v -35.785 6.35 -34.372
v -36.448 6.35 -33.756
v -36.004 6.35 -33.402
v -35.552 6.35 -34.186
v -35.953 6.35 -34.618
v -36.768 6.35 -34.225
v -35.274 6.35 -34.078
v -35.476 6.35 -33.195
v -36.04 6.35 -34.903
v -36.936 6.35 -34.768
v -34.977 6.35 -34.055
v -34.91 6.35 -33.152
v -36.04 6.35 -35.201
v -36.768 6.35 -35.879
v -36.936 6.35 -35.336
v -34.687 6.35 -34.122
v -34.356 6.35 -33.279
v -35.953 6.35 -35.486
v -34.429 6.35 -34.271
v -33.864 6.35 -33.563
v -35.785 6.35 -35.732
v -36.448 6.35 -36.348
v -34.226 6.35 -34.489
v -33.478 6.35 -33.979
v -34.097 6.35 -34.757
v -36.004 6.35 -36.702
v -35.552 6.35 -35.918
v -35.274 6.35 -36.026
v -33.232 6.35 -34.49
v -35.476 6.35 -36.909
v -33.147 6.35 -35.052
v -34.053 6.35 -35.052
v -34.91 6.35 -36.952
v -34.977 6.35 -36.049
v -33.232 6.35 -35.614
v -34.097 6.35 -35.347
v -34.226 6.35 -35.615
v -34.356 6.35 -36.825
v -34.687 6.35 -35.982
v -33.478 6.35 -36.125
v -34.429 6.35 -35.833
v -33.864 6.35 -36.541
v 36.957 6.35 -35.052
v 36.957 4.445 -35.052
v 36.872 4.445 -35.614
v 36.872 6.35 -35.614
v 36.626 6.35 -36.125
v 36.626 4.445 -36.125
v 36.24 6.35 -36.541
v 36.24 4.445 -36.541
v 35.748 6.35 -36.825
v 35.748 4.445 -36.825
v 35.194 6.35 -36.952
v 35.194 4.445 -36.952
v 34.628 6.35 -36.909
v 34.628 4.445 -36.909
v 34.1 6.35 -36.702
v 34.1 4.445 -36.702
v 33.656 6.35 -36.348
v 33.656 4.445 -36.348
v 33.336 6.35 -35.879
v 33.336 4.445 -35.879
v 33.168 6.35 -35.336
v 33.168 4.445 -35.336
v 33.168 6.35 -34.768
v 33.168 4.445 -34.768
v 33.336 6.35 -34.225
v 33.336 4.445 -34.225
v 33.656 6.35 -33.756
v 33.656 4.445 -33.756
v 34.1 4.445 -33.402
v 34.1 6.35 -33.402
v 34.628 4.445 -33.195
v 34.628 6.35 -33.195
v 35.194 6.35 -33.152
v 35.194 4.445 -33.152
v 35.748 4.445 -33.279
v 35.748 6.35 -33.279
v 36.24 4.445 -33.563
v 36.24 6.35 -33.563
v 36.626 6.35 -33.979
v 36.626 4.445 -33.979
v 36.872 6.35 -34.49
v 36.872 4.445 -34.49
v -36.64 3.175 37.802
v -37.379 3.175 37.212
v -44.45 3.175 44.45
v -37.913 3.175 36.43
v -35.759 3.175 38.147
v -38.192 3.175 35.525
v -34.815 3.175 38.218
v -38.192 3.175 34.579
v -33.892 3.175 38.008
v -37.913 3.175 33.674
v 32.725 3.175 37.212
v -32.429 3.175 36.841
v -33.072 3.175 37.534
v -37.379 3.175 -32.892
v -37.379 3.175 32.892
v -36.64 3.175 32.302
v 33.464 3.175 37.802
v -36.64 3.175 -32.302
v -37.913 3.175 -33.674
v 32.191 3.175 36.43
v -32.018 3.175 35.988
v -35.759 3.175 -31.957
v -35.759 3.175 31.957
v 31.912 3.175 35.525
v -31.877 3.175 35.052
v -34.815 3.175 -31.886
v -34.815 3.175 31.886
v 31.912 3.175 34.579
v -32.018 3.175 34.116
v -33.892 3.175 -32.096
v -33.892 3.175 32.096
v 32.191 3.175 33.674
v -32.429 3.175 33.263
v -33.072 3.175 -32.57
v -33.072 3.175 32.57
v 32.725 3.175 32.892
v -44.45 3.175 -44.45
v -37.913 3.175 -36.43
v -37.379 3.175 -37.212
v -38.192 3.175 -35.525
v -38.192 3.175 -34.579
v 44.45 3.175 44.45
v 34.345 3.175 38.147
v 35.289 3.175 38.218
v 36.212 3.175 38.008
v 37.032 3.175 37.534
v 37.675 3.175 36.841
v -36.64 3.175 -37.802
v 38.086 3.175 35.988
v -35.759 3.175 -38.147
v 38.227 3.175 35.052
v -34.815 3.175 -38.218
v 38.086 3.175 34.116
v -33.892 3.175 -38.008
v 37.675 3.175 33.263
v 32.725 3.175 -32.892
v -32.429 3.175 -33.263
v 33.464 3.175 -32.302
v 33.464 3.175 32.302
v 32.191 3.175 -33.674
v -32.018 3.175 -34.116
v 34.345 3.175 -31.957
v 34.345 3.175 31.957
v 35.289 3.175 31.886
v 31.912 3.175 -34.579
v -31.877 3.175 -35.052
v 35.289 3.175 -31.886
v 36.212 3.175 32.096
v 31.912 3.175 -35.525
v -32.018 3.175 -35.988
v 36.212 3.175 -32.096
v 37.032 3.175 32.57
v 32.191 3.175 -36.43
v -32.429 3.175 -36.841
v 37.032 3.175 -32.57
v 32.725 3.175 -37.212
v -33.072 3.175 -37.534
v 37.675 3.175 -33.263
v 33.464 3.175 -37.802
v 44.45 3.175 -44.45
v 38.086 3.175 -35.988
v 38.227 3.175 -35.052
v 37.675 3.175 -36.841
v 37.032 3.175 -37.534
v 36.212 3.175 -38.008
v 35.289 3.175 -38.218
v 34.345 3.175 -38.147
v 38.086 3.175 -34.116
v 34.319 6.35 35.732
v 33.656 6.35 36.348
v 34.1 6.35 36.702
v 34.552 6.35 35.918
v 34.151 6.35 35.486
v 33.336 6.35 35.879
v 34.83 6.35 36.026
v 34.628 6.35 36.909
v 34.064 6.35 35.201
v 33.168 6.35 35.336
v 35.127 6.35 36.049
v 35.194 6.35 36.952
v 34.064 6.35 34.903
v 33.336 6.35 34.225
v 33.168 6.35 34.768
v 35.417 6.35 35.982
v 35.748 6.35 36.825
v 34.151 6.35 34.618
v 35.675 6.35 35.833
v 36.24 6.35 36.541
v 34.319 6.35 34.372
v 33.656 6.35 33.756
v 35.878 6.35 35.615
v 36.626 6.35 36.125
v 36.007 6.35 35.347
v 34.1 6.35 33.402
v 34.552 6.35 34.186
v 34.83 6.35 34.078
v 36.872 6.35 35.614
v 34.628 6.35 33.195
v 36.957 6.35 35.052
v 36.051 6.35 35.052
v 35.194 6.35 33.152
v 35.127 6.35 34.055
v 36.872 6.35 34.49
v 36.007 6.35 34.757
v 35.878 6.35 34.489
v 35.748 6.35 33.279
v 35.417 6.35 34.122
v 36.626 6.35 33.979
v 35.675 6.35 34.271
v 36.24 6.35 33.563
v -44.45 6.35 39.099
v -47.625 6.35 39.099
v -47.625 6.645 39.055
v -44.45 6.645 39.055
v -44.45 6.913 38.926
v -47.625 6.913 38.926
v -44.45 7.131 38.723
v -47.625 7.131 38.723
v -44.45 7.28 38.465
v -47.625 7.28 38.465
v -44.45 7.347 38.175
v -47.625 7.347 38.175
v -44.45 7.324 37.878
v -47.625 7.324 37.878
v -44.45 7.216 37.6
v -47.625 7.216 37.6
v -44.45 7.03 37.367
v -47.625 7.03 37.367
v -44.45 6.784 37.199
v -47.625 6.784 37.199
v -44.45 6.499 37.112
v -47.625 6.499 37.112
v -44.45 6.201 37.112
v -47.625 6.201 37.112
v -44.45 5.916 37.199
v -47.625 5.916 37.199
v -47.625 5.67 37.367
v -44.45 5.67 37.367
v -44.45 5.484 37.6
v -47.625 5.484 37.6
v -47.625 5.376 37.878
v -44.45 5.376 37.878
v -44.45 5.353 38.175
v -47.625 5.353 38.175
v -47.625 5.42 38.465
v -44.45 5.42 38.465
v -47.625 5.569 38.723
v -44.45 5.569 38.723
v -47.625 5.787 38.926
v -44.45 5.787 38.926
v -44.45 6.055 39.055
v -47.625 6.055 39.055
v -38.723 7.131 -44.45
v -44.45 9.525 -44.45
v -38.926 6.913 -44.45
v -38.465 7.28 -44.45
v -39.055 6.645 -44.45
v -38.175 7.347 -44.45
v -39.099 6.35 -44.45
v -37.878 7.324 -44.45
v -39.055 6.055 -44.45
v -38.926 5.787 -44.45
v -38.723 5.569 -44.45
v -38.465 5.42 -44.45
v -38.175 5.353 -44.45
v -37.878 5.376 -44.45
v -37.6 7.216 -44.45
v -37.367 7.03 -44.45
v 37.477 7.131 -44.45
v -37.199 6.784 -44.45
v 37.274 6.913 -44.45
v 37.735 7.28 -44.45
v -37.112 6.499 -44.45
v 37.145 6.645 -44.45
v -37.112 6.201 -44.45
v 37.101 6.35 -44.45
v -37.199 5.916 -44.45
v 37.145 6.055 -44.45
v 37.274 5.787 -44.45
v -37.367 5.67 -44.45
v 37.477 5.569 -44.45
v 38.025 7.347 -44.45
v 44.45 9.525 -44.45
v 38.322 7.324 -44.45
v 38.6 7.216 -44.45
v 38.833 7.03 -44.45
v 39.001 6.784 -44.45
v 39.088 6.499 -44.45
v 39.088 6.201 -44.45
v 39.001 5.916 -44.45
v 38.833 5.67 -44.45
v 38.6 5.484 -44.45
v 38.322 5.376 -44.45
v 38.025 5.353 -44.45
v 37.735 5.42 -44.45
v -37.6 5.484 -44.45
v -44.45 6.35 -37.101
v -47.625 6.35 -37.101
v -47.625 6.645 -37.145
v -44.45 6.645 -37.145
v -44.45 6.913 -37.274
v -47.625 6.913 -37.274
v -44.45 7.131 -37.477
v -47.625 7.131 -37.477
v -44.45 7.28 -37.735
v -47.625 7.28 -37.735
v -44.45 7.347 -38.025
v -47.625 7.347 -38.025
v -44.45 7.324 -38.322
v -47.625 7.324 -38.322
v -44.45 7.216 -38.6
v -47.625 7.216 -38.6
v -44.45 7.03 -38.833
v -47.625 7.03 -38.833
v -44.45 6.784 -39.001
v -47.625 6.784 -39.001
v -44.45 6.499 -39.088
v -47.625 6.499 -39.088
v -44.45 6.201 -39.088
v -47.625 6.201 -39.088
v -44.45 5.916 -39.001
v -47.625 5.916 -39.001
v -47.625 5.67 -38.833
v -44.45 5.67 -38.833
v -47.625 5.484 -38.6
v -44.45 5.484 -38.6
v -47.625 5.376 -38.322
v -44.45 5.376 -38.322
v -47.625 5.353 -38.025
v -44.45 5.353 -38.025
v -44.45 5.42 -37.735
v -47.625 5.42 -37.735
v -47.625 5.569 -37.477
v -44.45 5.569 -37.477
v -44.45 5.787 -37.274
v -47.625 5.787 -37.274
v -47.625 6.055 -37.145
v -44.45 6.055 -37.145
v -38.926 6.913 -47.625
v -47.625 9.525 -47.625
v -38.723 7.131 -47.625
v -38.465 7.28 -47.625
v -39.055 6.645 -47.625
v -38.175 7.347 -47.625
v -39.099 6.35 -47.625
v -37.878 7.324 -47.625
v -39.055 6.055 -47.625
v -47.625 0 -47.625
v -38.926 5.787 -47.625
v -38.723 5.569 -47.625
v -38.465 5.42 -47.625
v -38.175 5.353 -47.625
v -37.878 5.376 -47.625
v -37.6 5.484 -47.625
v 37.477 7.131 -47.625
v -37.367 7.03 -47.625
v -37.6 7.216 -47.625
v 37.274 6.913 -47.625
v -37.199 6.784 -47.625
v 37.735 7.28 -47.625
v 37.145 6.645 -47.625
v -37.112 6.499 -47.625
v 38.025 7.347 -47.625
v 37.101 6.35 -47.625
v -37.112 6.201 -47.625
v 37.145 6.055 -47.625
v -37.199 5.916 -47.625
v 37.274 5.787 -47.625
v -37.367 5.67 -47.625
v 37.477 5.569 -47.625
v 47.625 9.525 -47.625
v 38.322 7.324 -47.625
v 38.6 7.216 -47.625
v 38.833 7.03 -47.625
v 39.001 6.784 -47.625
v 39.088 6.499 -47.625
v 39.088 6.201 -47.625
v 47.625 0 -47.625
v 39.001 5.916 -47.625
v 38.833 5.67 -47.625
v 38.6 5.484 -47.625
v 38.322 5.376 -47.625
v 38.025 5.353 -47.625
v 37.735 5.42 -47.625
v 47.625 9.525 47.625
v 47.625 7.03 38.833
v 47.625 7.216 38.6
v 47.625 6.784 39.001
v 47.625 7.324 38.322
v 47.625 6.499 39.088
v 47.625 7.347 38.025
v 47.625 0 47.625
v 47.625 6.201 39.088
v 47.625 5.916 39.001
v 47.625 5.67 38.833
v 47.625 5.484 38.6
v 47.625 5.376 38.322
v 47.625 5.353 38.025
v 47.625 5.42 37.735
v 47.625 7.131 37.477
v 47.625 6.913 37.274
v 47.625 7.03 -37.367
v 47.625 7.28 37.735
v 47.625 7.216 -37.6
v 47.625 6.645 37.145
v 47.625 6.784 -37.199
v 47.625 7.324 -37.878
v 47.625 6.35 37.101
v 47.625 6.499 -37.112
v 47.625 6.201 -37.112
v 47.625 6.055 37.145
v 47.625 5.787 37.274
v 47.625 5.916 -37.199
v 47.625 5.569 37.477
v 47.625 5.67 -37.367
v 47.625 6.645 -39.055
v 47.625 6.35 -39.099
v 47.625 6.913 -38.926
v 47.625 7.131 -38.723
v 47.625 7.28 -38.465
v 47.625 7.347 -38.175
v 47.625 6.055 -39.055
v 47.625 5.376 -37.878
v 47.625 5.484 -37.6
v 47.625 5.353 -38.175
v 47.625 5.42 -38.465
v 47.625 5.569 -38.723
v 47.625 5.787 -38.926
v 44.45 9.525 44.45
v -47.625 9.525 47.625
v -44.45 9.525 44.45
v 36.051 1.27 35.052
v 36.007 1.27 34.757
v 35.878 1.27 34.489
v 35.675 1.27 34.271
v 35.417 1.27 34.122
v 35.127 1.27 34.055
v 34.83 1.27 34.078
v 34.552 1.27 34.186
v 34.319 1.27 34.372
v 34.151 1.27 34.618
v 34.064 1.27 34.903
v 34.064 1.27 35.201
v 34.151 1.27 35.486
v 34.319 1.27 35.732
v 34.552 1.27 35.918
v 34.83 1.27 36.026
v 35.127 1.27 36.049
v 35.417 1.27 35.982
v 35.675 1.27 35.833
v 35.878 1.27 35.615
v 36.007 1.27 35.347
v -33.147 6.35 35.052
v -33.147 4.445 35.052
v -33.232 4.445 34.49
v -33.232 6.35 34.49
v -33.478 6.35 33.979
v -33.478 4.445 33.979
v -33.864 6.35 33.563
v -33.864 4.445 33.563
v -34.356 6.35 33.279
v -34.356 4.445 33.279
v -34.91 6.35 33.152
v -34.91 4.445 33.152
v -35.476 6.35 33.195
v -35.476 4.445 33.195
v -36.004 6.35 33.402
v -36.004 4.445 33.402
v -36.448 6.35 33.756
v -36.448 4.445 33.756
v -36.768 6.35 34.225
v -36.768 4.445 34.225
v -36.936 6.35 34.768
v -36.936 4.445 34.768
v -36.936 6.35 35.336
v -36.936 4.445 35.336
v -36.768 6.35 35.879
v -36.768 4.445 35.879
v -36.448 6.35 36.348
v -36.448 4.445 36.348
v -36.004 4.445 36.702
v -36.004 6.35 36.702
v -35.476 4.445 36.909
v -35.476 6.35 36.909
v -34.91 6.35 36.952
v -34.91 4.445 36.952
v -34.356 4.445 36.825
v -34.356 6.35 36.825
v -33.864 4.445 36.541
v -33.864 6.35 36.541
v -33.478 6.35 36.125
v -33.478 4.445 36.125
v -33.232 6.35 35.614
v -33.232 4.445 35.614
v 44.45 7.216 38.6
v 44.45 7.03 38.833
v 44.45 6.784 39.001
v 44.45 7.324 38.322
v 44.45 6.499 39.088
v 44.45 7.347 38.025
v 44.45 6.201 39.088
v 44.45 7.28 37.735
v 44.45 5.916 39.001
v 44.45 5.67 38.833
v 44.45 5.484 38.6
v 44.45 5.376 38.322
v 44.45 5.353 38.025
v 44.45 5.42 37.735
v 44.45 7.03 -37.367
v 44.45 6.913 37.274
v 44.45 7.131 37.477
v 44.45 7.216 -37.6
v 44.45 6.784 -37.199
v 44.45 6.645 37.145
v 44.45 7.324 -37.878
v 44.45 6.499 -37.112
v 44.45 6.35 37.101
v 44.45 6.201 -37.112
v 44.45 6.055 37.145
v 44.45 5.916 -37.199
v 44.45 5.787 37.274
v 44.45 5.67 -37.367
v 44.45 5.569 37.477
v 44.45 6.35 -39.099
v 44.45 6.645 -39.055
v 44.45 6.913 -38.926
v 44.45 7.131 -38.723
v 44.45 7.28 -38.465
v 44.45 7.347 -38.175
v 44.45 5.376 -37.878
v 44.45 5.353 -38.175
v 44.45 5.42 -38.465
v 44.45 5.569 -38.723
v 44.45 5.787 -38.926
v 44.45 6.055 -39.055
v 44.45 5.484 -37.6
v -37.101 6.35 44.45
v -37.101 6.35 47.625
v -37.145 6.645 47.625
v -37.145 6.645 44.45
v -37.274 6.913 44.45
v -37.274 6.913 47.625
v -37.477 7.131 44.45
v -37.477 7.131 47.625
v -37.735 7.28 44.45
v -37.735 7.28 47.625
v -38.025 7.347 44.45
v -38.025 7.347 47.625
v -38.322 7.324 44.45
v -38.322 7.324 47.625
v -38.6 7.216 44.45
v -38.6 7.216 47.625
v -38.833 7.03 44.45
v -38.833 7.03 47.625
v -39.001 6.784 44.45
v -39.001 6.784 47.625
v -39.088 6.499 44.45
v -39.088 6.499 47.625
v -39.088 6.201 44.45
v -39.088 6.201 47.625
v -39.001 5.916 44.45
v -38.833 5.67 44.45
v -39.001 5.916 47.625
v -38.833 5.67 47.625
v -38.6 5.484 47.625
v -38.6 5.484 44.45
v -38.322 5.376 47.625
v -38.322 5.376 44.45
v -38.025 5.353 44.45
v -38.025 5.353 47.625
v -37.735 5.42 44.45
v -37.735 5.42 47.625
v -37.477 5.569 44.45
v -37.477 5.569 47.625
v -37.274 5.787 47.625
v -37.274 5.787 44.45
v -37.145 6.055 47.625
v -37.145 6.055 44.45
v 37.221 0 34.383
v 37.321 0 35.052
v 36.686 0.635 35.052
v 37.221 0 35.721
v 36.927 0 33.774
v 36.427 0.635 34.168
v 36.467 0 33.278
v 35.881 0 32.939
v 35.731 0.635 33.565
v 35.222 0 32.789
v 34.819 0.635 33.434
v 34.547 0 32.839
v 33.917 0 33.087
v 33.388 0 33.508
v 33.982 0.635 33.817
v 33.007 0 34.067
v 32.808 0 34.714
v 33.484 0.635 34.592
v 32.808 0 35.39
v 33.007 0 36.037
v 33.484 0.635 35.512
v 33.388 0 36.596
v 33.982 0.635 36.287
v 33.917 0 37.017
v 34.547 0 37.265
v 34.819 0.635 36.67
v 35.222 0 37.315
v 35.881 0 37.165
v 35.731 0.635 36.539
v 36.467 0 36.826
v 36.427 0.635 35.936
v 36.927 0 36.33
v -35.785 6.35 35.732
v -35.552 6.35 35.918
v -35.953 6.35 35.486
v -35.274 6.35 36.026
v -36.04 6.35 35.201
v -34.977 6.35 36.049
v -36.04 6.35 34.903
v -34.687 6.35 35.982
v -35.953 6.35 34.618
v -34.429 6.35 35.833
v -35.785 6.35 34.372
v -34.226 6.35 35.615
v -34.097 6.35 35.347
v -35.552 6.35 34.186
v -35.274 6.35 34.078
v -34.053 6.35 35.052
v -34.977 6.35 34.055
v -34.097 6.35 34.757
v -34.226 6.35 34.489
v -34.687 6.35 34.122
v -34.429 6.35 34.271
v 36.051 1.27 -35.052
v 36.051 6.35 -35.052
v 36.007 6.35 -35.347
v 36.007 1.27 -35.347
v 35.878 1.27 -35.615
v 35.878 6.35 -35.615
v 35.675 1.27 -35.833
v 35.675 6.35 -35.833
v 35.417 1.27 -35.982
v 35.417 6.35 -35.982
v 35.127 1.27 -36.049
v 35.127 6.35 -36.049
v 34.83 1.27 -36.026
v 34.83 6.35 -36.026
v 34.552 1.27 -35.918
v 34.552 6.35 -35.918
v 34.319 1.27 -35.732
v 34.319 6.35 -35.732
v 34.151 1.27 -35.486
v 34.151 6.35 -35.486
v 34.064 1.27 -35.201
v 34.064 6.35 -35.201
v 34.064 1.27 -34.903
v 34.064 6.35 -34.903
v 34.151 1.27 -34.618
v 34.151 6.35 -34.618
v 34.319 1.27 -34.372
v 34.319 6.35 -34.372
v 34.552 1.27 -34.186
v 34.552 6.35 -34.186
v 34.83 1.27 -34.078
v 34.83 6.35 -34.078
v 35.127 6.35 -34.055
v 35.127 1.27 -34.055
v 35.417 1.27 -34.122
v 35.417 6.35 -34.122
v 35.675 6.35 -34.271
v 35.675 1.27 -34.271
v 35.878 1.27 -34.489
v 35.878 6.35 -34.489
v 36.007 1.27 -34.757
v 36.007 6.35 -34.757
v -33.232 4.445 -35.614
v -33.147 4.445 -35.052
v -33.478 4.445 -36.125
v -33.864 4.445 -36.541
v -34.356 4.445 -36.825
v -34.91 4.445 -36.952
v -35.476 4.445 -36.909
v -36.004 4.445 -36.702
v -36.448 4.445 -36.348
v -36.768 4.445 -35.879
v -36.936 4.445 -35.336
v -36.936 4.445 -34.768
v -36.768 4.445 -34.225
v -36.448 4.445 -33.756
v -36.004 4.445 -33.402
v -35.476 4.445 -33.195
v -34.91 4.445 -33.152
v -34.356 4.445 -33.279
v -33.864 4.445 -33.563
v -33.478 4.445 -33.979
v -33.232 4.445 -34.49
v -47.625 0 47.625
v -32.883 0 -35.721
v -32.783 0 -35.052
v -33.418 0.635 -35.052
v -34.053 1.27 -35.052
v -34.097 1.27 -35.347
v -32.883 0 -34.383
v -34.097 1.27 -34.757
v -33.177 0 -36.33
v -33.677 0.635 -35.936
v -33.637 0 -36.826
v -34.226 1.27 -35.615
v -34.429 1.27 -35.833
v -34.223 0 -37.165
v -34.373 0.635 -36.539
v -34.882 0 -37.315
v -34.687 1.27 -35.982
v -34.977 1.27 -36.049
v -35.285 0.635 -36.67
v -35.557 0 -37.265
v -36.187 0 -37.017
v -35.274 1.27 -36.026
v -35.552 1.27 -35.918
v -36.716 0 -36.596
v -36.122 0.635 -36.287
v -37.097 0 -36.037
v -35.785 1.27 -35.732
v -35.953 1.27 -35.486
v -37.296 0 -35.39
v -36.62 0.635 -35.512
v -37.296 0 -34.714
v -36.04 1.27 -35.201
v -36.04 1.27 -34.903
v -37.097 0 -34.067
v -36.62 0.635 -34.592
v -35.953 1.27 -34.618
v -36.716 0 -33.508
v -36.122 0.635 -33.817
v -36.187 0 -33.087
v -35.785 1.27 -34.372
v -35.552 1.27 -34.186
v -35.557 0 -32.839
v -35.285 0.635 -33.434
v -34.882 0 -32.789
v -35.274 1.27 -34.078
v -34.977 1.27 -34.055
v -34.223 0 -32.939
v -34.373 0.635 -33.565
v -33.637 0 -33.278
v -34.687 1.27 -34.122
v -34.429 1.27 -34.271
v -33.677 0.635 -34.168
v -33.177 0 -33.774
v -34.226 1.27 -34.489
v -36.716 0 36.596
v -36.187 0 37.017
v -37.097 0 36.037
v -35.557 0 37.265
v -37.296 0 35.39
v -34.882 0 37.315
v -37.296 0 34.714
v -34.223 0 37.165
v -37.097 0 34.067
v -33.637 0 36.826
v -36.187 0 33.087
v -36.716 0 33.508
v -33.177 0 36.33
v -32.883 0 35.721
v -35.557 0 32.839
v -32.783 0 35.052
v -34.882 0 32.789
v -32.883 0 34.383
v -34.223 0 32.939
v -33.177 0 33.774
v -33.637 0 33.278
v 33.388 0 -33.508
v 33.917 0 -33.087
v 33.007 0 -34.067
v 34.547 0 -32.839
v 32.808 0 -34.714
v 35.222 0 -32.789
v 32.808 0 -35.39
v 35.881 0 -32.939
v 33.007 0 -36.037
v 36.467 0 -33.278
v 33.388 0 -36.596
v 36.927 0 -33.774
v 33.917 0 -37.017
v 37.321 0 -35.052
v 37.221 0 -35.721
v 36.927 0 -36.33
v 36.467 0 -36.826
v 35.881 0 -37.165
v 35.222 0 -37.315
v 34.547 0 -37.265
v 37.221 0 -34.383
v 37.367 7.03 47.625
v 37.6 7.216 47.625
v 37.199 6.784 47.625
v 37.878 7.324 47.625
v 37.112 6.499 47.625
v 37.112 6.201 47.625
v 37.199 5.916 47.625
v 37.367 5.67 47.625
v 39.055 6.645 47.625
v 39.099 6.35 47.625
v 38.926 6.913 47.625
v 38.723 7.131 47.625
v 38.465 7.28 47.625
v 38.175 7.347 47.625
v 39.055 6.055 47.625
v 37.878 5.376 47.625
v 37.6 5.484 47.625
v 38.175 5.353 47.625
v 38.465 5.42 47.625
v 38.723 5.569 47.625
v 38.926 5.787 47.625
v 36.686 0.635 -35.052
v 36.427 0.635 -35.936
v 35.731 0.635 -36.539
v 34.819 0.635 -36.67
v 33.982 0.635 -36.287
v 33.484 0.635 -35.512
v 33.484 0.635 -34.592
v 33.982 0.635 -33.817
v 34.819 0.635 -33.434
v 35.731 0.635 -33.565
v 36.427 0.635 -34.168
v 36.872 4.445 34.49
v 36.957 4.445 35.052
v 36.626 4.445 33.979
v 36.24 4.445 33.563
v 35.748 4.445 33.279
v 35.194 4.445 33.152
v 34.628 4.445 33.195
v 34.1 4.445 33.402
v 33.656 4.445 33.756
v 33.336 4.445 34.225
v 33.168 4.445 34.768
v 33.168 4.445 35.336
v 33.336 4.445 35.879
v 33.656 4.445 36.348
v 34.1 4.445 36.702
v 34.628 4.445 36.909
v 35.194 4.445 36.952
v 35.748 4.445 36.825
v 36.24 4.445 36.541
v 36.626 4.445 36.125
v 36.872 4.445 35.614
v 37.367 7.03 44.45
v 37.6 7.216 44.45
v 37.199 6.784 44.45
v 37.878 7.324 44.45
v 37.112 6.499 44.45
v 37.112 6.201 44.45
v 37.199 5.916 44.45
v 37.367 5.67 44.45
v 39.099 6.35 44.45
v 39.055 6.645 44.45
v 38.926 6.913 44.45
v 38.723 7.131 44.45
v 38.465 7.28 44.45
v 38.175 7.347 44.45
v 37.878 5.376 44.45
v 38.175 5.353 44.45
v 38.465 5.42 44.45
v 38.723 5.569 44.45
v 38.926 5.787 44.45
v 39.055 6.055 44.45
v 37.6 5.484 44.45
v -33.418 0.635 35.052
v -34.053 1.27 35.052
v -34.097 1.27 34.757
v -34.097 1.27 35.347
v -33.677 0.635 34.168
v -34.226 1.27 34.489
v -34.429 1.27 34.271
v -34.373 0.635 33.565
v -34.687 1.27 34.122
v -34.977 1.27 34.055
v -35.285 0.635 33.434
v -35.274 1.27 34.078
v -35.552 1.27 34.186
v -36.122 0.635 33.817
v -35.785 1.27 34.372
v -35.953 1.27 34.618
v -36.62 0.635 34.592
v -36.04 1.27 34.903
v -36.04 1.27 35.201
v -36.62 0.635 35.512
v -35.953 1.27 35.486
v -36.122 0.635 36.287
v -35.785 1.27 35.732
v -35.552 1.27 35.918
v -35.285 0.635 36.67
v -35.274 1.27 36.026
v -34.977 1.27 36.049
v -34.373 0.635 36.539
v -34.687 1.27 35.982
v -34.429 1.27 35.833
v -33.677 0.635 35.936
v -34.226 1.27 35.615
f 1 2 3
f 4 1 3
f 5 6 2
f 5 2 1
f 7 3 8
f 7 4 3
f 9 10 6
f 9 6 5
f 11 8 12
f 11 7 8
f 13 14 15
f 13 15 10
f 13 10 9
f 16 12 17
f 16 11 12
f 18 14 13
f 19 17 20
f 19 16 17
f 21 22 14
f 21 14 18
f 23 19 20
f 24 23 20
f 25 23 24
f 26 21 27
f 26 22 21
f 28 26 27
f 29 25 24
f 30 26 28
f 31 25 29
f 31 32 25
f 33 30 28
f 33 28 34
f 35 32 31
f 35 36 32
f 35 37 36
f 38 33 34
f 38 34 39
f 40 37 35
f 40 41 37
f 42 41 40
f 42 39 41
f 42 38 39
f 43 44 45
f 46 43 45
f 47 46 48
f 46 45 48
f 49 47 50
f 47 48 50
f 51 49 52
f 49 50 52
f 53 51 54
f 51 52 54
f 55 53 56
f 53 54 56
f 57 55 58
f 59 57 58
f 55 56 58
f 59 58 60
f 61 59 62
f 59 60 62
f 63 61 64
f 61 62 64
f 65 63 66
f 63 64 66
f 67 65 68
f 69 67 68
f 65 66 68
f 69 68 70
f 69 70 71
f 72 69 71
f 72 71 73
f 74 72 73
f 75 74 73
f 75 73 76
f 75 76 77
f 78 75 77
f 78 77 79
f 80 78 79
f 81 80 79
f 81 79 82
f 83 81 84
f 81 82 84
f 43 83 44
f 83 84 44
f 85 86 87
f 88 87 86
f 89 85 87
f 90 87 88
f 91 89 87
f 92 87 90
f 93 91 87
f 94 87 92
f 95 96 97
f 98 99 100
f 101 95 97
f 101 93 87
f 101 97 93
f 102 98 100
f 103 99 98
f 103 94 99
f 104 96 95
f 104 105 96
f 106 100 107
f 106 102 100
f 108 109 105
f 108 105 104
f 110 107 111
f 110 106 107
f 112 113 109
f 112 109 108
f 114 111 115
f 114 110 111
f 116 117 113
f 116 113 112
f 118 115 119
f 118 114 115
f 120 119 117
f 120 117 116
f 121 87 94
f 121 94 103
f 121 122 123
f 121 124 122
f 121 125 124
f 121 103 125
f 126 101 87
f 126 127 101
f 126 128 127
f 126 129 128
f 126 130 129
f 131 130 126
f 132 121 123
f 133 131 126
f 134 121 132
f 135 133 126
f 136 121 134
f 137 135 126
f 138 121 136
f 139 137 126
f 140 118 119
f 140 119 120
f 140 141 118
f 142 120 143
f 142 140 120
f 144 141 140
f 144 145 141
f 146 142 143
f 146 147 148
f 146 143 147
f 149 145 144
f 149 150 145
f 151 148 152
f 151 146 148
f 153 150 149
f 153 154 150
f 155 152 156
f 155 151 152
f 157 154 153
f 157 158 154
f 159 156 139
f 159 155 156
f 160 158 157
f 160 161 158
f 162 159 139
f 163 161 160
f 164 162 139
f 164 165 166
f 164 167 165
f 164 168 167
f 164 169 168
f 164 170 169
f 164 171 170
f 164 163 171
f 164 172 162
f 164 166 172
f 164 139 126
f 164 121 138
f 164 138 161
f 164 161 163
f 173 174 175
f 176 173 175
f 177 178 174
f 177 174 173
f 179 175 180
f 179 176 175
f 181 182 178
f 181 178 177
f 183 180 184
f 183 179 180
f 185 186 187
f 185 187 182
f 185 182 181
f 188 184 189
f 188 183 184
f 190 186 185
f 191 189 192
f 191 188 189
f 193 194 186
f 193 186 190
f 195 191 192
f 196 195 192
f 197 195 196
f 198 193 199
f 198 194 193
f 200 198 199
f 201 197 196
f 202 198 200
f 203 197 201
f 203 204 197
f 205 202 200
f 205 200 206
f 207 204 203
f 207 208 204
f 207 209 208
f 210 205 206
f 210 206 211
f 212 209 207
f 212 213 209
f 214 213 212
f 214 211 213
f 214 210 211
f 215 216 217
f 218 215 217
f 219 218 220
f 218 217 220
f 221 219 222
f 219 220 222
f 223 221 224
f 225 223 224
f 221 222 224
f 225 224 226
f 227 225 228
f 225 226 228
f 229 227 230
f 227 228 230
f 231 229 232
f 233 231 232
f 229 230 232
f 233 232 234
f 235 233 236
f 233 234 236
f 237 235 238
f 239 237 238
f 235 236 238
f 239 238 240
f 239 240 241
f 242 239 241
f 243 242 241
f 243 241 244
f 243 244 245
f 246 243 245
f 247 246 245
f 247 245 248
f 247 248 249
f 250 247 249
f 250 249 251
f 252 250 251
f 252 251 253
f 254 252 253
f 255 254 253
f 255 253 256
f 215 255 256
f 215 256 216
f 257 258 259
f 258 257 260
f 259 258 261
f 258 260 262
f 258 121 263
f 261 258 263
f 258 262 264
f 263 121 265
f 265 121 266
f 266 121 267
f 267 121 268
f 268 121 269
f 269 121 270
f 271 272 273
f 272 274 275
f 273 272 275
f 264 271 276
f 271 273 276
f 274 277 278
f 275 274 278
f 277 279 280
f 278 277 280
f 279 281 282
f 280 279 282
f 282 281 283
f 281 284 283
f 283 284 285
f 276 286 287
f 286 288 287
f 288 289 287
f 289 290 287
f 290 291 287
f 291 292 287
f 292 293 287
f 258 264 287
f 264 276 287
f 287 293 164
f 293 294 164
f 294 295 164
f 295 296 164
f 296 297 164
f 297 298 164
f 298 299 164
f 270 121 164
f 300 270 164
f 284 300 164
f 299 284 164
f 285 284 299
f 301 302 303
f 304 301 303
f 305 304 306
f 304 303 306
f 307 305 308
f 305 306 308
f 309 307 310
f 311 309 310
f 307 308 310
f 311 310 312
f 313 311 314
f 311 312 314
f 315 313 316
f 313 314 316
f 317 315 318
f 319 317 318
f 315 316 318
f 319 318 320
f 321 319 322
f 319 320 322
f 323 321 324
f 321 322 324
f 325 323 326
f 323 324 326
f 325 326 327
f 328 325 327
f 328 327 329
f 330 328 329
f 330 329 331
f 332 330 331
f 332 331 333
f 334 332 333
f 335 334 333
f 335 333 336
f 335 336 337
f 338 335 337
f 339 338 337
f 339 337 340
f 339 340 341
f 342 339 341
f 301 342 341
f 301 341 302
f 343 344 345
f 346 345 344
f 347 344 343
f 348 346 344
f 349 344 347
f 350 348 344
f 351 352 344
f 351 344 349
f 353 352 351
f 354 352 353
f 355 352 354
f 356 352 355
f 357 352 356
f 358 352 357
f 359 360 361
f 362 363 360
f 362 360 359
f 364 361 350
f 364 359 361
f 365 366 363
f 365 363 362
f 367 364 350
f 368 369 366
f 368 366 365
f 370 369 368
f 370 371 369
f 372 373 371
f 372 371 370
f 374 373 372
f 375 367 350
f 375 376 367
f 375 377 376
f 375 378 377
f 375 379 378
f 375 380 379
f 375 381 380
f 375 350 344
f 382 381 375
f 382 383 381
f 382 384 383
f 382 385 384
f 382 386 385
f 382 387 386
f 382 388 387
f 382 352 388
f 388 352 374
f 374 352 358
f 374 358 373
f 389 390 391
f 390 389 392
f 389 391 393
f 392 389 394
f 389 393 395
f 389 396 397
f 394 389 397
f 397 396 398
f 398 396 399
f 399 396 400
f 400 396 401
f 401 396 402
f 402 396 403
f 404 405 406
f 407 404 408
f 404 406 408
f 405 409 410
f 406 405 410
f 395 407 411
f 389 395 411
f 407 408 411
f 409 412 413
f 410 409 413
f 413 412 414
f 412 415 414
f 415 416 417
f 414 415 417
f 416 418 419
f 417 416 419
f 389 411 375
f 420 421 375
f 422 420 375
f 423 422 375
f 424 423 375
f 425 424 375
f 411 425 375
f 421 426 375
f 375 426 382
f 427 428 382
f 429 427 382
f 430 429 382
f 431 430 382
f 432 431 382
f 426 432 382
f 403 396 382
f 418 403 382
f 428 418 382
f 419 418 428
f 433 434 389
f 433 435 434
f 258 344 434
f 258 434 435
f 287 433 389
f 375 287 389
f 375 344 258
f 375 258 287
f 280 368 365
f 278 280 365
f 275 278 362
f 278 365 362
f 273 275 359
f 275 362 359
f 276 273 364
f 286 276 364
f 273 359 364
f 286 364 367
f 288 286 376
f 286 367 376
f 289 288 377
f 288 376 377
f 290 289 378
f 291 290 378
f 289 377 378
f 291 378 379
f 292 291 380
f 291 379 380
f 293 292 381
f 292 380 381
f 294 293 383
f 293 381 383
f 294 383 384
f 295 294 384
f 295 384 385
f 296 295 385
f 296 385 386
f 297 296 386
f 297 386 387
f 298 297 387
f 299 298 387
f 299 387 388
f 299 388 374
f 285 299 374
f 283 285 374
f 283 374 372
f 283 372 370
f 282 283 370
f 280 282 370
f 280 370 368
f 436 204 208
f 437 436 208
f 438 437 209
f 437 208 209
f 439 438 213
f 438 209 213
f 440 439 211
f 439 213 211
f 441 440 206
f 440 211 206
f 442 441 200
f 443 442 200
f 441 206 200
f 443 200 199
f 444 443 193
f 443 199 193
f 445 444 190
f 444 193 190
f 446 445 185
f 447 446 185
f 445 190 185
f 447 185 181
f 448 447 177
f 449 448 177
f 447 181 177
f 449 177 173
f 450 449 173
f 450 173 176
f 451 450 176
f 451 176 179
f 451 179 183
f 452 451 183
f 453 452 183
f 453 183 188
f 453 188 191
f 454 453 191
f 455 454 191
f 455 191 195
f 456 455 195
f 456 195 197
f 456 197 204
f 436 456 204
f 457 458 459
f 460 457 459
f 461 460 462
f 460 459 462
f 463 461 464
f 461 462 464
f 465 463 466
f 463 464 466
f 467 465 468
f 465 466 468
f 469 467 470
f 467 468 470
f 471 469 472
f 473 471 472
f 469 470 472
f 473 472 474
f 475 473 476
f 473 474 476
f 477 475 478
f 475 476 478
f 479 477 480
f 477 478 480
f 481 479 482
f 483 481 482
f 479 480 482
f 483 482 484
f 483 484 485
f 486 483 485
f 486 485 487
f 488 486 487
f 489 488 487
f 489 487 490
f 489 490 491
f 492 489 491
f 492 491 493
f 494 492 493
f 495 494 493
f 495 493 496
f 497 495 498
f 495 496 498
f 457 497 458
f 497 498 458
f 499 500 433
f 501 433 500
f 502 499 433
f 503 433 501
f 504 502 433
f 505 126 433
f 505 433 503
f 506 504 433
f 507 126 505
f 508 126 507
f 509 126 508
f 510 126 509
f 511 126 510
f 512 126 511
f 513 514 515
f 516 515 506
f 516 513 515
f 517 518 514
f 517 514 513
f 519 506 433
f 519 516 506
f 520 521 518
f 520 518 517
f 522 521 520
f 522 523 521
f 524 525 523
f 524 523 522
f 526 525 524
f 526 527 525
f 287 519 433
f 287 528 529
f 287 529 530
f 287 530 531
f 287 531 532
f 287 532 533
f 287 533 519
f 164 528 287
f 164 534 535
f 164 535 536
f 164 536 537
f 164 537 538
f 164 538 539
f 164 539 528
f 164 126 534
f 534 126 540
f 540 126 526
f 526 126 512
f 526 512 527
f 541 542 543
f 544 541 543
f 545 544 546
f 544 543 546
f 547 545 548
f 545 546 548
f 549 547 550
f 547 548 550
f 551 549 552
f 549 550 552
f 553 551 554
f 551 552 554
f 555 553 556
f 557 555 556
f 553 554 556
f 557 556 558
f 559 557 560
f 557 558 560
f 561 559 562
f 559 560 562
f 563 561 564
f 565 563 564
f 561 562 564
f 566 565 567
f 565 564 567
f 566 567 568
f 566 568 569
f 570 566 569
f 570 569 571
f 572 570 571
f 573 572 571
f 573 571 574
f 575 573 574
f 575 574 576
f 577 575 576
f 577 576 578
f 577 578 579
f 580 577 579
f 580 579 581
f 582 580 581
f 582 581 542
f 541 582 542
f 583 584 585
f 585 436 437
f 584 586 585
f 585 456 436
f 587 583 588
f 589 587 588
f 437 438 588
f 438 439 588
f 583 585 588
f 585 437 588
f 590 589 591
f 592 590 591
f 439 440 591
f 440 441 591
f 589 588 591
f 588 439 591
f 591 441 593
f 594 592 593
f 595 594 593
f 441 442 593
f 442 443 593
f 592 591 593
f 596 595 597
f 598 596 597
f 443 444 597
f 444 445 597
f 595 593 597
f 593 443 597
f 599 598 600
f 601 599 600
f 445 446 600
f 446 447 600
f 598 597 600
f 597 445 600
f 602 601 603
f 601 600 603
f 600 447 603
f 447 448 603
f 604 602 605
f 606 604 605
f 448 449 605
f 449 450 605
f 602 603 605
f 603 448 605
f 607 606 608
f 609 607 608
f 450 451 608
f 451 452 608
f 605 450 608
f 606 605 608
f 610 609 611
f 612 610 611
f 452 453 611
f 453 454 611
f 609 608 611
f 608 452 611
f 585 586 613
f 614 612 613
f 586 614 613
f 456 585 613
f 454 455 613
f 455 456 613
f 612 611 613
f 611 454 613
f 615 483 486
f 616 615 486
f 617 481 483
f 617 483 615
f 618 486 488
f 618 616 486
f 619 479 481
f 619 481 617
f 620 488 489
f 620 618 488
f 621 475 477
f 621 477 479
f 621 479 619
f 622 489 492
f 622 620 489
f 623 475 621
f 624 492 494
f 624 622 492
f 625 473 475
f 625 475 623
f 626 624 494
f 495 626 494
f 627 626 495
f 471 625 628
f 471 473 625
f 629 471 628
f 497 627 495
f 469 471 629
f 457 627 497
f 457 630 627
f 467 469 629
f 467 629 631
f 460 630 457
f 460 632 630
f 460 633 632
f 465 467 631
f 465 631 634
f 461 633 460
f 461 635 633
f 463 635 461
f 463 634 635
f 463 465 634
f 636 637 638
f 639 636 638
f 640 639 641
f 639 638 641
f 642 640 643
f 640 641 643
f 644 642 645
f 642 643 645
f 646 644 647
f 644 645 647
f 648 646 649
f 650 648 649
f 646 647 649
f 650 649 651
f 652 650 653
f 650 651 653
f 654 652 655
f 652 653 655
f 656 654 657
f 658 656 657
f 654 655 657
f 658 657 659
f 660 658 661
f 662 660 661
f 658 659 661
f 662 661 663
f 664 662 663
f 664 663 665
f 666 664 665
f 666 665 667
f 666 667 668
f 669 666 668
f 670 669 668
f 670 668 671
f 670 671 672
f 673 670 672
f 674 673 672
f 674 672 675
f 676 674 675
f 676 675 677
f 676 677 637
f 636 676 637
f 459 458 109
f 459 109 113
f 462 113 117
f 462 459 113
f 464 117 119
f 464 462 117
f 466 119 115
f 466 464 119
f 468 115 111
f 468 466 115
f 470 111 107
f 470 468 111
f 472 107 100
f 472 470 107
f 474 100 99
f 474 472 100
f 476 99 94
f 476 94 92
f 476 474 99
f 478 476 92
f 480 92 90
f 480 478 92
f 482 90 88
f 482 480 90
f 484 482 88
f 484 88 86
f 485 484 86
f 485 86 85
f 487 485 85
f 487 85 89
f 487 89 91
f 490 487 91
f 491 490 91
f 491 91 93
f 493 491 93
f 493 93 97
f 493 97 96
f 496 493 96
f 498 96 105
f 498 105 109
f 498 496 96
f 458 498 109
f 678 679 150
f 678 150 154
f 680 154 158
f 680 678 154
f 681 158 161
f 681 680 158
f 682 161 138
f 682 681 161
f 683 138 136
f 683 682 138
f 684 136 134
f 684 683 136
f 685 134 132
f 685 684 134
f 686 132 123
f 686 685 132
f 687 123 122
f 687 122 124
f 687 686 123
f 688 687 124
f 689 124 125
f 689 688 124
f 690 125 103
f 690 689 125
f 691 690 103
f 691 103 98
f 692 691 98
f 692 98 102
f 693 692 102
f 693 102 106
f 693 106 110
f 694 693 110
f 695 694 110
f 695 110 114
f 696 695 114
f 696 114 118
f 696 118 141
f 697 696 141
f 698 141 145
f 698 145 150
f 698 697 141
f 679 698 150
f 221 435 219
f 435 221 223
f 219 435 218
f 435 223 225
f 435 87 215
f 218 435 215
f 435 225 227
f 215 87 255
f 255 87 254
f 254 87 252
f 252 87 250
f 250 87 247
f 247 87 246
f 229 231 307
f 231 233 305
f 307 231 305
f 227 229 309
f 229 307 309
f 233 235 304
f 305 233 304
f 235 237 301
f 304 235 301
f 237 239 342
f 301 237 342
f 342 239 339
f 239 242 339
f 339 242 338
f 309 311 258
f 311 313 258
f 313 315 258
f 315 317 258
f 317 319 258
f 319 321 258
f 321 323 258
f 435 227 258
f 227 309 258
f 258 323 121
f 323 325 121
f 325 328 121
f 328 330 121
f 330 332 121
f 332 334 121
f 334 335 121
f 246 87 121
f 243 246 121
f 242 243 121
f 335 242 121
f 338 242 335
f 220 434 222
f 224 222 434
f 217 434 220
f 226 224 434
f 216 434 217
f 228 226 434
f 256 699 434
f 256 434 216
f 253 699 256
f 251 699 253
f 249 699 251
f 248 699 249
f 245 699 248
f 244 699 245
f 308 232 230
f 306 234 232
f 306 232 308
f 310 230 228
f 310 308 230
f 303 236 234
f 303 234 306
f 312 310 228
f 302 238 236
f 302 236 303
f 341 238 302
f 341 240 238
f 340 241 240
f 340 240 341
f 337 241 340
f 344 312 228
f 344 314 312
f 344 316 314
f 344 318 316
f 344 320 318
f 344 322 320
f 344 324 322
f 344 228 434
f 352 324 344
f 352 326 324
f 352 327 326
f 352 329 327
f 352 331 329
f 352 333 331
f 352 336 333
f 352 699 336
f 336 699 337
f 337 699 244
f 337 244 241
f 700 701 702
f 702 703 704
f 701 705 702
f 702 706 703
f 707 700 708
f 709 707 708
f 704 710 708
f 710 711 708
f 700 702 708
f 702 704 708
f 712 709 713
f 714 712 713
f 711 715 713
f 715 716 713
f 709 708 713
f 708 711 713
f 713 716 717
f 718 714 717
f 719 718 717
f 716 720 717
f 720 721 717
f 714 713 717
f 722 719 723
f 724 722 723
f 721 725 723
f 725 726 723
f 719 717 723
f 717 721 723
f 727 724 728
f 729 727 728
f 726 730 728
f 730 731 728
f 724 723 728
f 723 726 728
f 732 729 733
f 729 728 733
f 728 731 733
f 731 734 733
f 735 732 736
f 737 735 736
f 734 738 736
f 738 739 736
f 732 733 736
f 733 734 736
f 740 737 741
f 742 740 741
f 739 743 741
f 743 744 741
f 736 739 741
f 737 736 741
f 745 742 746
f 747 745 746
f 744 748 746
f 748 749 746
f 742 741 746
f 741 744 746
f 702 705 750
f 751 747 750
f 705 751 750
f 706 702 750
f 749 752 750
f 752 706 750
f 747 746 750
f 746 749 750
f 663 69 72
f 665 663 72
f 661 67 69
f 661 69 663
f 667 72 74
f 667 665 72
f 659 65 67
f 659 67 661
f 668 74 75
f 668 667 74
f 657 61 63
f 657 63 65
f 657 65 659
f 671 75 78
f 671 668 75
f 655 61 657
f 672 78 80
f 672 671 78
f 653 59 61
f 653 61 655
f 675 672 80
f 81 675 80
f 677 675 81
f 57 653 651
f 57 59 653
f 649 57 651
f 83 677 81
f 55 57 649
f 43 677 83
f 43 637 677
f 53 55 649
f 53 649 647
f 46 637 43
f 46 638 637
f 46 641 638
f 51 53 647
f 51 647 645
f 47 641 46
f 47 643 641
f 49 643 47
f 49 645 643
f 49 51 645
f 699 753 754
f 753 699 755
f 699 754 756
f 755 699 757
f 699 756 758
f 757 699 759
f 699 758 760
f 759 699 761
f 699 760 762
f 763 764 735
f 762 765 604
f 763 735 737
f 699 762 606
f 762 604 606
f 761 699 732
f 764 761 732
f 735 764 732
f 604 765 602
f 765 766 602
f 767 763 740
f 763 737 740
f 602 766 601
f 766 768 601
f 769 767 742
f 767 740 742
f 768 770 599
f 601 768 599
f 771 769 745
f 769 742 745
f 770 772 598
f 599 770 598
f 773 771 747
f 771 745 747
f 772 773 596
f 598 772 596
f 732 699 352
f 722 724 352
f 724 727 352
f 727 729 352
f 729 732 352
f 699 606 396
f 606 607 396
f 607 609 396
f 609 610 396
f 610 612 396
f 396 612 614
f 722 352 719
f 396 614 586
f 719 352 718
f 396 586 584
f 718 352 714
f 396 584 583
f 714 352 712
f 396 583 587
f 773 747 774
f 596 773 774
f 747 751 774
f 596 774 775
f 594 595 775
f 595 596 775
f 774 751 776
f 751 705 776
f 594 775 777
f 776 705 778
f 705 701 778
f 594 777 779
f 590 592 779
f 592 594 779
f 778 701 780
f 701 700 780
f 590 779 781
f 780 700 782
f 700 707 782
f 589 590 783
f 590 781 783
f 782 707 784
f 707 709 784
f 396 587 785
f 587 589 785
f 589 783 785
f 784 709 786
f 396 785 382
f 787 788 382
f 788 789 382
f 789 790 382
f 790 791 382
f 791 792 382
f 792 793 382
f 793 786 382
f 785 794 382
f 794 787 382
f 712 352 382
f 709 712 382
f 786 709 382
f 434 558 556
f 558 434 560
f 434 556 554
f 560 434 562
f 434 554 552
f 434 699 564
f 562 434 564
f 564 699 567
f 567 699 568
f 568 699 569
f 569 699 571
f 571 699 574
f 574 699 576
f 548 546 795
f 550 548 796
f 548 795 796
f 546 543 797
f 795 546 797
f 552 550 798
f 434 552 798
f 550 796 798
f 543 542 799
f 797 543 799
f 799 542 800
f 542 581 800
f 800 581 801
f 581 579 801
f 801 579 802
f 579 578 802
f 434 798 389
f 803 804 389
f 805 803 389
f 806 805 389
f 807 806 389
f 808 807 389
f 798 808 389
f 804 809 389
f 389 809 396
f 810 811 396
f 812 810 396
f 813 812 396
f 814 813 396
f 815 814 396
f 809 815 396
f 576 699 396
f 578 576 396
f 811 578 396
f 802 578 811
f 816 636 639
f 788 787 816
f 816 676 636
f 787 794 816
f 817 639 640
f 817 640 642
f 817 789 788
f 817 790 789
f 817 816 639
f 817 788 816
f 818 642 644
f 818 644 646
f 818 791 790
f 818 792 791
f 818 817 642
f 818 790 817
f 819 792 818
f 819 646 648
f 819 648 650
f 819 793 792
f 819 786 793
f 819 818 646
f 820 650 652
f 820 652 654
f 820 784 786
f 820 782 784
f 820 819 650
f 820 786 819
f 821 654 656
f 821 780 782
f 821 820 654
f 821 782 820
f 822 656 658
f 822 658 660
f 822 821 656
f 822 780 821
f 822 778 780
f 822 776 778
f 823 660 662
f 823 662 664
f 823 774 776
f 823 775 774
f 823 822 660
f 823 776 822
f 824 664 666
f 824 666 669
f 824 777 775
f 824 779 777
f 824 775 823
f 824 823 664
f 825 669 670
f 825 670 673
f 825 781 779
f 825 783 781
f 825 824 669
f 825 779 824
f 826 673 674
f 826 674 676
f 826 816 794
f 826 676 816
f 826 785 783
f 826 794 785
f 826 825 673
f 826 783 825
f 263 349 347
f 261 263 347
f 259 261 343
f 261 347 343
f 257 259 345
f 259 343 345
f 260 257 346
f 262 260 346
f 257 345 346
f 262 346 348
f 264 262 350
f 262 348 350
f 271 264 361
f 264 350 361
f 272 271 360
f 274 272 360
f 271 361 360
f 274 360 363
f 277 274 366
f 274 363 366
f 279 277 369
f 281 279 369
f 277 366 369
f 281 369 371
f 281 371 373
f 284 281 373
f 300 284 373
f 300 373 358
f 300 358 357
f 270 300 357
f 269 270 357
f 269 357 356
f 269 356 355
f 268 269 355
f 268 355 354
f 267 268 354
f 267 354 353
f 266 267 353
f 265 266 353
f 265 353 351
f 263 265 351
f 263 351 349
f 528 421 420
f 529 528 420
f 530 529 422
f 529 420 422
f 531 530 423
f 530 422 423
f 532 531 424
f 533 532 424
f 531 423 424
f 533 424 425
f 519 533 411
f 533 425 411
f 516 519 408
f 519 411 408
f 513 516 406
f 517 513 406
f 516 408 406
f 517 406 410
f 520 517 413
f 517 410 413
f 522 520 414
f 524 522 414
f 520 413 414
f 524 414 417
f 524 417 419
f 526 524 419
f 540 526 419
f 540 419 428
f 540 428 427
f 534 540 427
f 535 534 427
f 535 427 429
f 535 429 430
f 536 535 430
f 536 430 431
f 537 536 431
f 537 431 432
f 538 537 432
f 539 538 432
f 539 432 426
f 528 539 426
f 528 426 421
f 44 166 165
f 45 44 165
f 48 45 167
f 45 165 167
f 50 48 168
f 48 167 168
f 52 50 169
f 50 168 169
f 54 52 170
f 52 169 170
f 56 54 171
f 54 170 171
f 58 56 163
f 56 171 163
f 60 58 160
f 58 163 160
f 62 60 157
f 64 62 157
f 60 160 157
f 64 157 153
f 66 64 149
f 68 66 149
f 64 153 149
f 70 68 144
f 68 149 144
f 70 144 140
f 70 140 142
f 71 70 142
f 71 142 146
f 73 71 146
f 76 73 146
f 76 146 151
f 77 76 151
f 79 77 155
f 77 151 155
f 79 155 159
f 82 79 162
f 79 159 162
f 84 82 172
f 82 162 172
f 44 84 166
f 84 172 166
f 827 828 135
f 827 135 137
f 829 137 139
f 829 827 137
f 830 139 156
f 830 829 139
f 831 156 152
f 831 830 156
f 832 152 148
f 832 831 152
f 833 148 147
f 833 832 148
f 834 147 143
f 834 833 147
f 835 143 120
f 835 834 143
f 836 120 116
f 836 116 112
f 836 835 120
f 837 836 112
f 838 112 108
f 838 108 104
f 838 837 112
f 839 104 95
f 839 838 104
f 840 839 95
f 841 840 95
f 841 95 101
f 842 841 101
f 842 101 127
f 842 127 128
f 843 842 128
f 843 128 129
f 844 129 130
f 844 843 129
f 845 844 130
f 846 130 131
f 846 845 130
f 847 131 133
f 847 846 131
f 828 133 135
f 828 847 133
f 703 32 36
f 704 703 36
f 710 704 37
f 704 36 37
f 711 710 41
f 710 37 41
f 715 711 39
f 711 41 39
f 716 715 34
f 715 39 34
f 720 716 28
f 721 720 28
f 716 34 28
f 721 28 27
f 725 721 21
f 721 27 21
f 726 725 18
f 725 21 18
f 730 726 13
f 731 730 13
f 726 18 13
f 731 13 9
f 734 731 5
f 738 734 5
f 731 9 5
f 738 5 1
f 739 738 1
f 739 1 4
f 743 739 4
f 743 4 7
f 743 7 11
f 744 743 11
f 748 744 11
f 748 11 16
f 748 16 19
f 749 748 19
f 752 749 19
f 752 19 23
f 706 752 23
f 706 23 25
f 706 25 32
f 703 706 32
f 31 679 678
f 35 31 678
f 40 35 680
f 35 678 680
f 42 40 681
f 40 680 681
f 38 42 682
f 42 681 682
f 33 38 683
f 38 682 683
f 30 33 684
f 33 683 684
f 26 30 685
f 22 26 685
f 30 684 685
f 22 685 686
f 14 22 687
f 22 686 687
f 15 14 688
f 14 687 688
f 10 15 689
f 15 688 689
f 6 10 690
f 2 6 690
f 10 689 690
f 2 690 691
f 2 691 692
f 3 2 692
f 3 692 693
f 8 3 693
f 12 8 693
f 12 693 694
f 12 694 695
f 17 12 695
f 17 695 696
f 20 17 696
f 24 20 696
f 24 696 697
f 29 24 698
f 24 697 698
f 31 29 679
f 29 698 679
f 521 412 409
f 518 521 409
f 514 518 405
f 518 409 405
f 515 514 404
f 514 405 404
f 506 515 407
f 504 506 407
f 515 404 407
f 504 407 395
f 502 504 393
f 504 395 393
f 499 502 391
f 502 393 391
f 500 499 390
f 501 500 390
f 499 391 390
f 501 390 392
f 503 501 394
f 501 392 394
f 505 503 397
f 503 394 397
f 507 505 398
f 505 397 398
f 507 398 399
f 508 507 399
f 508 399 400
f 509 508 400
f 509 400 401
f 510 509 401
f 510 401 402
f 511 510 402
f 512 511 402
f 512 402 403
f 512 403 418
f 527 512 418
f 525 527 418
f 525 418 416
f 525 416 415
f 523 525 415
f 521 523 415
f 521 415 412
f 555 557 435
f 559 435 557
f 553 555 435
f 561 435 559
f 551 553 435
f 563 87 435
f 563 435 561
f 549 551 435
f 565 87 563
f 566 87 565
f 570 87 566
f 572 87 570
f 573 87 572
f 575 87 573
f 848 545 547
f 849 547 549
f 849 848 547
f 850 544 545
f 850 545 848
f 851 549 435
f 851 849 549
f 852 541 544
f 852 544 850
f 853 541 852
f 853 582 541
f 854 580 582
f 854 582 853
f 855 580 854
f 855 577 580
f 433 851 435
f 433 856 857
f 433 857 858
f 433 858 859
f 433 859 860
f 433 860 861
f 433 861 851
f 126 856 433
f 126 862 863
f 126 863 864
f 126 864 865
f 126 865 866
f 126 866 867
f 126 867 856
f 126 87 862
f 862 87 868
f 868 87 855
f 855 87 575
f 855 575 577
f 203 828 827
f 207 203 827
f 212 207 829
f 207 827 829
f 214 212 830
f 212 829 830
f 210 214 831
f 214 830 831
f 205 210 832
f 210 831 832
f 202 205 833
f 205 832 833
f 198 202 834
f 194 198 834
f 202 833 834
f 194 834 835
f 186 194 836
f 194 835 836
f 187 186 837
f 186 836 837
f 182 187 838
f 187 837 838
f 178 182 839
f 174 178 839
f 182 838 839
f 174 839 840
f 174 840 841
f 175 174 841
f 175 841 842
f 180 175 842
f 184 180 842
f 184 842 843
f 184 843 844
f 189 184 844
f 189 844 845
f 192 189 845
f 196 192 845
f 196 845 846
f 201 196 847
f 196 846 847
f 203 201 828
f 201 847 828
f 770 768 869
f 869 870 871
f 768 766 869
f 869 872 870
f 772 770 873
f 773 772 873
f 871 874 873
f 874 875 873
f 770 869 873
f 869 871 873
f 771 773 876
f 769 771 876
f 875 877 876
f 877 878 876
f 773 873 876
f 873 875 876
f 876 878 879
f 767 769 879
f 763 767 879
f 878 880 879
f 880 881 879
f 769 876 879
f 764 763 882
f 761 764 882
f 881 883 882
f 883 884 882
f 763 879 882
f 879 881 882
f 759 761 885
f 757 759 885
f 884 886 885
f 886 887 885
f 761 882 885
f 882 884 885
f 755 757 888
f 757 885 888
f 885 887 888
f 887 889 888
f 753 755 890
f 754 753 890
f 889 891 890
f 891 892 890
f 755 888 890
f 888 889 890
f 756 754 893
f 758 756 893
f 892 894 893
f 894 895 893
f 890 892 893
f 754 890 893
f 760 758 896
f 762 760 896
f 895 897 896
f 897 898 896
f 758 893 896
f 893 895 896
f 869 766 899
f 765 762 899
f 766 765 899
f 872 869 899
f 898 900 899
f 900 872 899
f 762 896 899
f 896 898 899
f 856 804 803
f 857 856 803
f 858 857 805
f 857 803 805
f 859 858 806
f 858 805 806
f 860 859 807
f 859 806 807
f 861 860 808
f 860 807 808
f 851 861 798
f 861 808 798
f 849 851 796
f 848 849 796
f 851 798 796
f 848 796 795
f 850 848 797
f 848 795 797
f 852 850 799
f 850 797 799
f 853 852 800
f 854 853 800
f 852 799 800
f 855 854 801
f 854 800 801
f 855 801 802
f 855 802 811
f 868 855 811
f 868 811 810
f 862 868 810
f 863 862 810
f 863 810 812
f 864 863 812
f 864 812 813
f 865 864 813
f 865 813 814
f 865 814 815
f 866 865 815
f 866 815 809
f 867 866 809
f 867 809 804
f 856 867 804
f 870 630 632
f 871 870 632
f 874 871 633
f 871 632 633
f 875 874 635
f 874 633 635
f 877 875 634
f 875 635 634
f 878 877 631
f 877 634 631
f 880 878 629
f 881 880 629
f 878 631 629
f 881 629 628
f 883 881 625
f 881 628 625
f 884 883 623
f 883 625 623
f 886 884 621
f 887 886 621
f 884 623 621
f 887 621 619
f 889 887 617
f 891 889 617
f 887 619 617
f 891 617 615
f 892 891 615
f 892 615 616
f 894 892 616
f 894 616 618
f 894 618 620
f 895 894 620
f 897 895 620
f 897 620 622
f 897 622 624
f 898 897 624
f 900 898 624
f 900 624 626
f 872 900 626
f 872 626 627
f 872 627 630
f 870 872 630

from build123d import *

# Parameters (mm, degrees)
SKETCH1_W           = 101.6
SKETCH1_H           = 101.6
BOSS_EXTRUDE1_DEPTH = 3.175
SKETCH2_W           = 101.6
SKETCH2_H           = 101.6
SKETCH2_W_2         = 88.9
SKETCH2_H_2         = 88.9
BOSS_EXTRUDE2_DEPTH = 6.35
SKETCH3_R           = 0.99949
CUT_EXTRUDE1_DEPTH  = 6.35
CIRPATTERN1_COUNT   = 4
SKETCH4_W           = 101.6
SKETCH4_H           = 101.6
SKETCH4_W_2         = 95.25
SKETCH4_H_2         = 95.25
CUT_EXTRUDE2_DEPTH  = 9.525
SKETCH5_R           = 1.905
SKETCH5_R_2         = 0.99949
BOSS_EXTRUDE3_DEPTH = 3.175
SKETCH6_R           = 0.99949
CUT_EXTRUDE3_DEPTH  = 7.35
CHAMFER1_SIZE       = 1.27
CHAMFER2_SIZE       = 1.27


with BuildPart() as part:
    # Sketch1 → Boss-Extrude1 (new body)
    with BuildSketch(Plane(origin=(0, 0, 0), x_dir=(1, 0, 0), z_dir=(0, 1, 0))):
        Rectangle(SKETCH1_W, SKETCH1_H)
    extrude(amount=BOSS_EXTRUDE1_DEPTH)

    # Sketch2 → Boss-Extrude2 (add)
    with BuildSketch(Plane(origin=(0, 3.175, 0), x_dir=(1, 0, 0), z_dir=(0, 1, 0))):
        Rectangle(SKETCH2_W, SKETCH2_H)
        Rectangle(SKETCH2_W_2, SKETCH2_H_2, mode=Mode.SUBTRACT)
    extrude(amount=BOSS_EXTRUDE2_DEPTH)

    # Sketch3 → Cut-Extrude1 (cut)
    with BuildSketch(Plane.XY.offset(50.8)):
        with Locations((-38.1, 6.35)):
            Circle(SKETCH3_R)
        with Locations((38.1, 6.35)):
            Circle(SKETCH3_R)
    cut_extrude1 = extrude(amount=-CUT_EXTRUDE1_DEPTH, mode=Mode.SUBTRACT)

    # CirPattern1: Cut-Extrude1 ×4 about axis
    cirpattern1_axis = Axis((0, 10.00125, 0), (0, -1, 0))
    for i in range(1, CIRPATTERN1_COUNT):
        add(cut_extrude1.rotate(cirpattern1_axis, i * 360 / CIRPATTERN1_COUNT), mode=Mode.SUBTRACT)

    # Sketch4 → Cut-Extrude2 (cut)
    with BuildSketch(Plane(origin=(0, 0, 0), x_dir=(1, 0, 0), z_dir=(0, 1, 0))):
        Rectangle(SKETCH4_W, SKETCH4_H)
        Rectangle(SKETCH4_W_2, SKETCH4_H_2, mode=Mode.SUBTRACT)
    extrude(amount=CUT_EXTRUDE2_DEPTH, mode=Mode.SUBTRACT)

    # Sketch5 → Boss-Extrude3 (add)
    with BuildSketch(Plane(origin=(0, 3.175, 0), x_dir=(1, 0, 0), z_dir=(0, 1, 0))):
        with Locations((-35.052, -35.052)):
            Circle(SKETCH5_R)
        with Locations((-35.052, -35.052)):
            Circle(SKETCH5_R_2, mode=Mode.SUBTRACT)
        with Locations((35.052, -35.052)):
            Circle(SKETCH5_R)
        with Locations((35.052, -35.052)):
            Circle(SKETCH5_R_2, mode=Mode.SUBTRACT)
        with Locations((35.052, 35.052)):
            Circle(SKETCH5_R)
        with Locations((35.052, 35.052)):
            Circle(SKETCH5_R_2, mode=Mode.SUBTRACT)
        with Locations((-35.052, 35.052)):
            Circle(SKETCH5_R)
        with Locations((-35.052, 35.052)):
            Circle(SKETCH5_R_2, mode=Mode.SUBTRACT)
    extrude(amount=BOSS_EXTRUDE3_DEPTH)

    # Sketch6 → Cut-Extrude3 (cut, through all)
    with BuildSketch(Plane(origin=(0, 6.35, 0), x_dir=(1, 0, 0), z_dir=(0, 1, 0))):
        with Locations((-35.052, 35.052)):
            Circle(SKETCH6_R)
        with Locations((35.052, 35.052)):
            Circle(SKETCH6_R)
        with Locations((35.052, -35.052)):
            Circle(SKETCH6_R)
        with Locations((-35.052, -35.052)):
            Circle(SKETCH6_R)
    extrude(amount=-CUT_EXTRUDE3_DEPTH, mode=Mode.SUBTRACT)

    # Chamfer1
    chamfer1_edges = [part.edges().sort_by_distance(p)[0] for p in [
        (-36.05149, 0, 35.052),
        (34.05251, 0, 35.052),
        (34.05251, 0, -35.052),
        (-36.05149, 0, -35.052),
    ]]
    chamfer(chamfer1_edges, length=CHAMFER1_SIZE)

    # Chamfer2
    chamfer2_edges = [part.edges().sort_by_distance(p)[0] for p in [
        (-36.957, 3.175, 35.052),
        (33.147, 3.175, 35.052),
        (33.147, 3.175, -35.052),
        (-36.957, 3.175, -35.052),
    ]]
    chamfer(chamfer2_edges, length=CHAMFER2_SIZE)


solid = part.part
